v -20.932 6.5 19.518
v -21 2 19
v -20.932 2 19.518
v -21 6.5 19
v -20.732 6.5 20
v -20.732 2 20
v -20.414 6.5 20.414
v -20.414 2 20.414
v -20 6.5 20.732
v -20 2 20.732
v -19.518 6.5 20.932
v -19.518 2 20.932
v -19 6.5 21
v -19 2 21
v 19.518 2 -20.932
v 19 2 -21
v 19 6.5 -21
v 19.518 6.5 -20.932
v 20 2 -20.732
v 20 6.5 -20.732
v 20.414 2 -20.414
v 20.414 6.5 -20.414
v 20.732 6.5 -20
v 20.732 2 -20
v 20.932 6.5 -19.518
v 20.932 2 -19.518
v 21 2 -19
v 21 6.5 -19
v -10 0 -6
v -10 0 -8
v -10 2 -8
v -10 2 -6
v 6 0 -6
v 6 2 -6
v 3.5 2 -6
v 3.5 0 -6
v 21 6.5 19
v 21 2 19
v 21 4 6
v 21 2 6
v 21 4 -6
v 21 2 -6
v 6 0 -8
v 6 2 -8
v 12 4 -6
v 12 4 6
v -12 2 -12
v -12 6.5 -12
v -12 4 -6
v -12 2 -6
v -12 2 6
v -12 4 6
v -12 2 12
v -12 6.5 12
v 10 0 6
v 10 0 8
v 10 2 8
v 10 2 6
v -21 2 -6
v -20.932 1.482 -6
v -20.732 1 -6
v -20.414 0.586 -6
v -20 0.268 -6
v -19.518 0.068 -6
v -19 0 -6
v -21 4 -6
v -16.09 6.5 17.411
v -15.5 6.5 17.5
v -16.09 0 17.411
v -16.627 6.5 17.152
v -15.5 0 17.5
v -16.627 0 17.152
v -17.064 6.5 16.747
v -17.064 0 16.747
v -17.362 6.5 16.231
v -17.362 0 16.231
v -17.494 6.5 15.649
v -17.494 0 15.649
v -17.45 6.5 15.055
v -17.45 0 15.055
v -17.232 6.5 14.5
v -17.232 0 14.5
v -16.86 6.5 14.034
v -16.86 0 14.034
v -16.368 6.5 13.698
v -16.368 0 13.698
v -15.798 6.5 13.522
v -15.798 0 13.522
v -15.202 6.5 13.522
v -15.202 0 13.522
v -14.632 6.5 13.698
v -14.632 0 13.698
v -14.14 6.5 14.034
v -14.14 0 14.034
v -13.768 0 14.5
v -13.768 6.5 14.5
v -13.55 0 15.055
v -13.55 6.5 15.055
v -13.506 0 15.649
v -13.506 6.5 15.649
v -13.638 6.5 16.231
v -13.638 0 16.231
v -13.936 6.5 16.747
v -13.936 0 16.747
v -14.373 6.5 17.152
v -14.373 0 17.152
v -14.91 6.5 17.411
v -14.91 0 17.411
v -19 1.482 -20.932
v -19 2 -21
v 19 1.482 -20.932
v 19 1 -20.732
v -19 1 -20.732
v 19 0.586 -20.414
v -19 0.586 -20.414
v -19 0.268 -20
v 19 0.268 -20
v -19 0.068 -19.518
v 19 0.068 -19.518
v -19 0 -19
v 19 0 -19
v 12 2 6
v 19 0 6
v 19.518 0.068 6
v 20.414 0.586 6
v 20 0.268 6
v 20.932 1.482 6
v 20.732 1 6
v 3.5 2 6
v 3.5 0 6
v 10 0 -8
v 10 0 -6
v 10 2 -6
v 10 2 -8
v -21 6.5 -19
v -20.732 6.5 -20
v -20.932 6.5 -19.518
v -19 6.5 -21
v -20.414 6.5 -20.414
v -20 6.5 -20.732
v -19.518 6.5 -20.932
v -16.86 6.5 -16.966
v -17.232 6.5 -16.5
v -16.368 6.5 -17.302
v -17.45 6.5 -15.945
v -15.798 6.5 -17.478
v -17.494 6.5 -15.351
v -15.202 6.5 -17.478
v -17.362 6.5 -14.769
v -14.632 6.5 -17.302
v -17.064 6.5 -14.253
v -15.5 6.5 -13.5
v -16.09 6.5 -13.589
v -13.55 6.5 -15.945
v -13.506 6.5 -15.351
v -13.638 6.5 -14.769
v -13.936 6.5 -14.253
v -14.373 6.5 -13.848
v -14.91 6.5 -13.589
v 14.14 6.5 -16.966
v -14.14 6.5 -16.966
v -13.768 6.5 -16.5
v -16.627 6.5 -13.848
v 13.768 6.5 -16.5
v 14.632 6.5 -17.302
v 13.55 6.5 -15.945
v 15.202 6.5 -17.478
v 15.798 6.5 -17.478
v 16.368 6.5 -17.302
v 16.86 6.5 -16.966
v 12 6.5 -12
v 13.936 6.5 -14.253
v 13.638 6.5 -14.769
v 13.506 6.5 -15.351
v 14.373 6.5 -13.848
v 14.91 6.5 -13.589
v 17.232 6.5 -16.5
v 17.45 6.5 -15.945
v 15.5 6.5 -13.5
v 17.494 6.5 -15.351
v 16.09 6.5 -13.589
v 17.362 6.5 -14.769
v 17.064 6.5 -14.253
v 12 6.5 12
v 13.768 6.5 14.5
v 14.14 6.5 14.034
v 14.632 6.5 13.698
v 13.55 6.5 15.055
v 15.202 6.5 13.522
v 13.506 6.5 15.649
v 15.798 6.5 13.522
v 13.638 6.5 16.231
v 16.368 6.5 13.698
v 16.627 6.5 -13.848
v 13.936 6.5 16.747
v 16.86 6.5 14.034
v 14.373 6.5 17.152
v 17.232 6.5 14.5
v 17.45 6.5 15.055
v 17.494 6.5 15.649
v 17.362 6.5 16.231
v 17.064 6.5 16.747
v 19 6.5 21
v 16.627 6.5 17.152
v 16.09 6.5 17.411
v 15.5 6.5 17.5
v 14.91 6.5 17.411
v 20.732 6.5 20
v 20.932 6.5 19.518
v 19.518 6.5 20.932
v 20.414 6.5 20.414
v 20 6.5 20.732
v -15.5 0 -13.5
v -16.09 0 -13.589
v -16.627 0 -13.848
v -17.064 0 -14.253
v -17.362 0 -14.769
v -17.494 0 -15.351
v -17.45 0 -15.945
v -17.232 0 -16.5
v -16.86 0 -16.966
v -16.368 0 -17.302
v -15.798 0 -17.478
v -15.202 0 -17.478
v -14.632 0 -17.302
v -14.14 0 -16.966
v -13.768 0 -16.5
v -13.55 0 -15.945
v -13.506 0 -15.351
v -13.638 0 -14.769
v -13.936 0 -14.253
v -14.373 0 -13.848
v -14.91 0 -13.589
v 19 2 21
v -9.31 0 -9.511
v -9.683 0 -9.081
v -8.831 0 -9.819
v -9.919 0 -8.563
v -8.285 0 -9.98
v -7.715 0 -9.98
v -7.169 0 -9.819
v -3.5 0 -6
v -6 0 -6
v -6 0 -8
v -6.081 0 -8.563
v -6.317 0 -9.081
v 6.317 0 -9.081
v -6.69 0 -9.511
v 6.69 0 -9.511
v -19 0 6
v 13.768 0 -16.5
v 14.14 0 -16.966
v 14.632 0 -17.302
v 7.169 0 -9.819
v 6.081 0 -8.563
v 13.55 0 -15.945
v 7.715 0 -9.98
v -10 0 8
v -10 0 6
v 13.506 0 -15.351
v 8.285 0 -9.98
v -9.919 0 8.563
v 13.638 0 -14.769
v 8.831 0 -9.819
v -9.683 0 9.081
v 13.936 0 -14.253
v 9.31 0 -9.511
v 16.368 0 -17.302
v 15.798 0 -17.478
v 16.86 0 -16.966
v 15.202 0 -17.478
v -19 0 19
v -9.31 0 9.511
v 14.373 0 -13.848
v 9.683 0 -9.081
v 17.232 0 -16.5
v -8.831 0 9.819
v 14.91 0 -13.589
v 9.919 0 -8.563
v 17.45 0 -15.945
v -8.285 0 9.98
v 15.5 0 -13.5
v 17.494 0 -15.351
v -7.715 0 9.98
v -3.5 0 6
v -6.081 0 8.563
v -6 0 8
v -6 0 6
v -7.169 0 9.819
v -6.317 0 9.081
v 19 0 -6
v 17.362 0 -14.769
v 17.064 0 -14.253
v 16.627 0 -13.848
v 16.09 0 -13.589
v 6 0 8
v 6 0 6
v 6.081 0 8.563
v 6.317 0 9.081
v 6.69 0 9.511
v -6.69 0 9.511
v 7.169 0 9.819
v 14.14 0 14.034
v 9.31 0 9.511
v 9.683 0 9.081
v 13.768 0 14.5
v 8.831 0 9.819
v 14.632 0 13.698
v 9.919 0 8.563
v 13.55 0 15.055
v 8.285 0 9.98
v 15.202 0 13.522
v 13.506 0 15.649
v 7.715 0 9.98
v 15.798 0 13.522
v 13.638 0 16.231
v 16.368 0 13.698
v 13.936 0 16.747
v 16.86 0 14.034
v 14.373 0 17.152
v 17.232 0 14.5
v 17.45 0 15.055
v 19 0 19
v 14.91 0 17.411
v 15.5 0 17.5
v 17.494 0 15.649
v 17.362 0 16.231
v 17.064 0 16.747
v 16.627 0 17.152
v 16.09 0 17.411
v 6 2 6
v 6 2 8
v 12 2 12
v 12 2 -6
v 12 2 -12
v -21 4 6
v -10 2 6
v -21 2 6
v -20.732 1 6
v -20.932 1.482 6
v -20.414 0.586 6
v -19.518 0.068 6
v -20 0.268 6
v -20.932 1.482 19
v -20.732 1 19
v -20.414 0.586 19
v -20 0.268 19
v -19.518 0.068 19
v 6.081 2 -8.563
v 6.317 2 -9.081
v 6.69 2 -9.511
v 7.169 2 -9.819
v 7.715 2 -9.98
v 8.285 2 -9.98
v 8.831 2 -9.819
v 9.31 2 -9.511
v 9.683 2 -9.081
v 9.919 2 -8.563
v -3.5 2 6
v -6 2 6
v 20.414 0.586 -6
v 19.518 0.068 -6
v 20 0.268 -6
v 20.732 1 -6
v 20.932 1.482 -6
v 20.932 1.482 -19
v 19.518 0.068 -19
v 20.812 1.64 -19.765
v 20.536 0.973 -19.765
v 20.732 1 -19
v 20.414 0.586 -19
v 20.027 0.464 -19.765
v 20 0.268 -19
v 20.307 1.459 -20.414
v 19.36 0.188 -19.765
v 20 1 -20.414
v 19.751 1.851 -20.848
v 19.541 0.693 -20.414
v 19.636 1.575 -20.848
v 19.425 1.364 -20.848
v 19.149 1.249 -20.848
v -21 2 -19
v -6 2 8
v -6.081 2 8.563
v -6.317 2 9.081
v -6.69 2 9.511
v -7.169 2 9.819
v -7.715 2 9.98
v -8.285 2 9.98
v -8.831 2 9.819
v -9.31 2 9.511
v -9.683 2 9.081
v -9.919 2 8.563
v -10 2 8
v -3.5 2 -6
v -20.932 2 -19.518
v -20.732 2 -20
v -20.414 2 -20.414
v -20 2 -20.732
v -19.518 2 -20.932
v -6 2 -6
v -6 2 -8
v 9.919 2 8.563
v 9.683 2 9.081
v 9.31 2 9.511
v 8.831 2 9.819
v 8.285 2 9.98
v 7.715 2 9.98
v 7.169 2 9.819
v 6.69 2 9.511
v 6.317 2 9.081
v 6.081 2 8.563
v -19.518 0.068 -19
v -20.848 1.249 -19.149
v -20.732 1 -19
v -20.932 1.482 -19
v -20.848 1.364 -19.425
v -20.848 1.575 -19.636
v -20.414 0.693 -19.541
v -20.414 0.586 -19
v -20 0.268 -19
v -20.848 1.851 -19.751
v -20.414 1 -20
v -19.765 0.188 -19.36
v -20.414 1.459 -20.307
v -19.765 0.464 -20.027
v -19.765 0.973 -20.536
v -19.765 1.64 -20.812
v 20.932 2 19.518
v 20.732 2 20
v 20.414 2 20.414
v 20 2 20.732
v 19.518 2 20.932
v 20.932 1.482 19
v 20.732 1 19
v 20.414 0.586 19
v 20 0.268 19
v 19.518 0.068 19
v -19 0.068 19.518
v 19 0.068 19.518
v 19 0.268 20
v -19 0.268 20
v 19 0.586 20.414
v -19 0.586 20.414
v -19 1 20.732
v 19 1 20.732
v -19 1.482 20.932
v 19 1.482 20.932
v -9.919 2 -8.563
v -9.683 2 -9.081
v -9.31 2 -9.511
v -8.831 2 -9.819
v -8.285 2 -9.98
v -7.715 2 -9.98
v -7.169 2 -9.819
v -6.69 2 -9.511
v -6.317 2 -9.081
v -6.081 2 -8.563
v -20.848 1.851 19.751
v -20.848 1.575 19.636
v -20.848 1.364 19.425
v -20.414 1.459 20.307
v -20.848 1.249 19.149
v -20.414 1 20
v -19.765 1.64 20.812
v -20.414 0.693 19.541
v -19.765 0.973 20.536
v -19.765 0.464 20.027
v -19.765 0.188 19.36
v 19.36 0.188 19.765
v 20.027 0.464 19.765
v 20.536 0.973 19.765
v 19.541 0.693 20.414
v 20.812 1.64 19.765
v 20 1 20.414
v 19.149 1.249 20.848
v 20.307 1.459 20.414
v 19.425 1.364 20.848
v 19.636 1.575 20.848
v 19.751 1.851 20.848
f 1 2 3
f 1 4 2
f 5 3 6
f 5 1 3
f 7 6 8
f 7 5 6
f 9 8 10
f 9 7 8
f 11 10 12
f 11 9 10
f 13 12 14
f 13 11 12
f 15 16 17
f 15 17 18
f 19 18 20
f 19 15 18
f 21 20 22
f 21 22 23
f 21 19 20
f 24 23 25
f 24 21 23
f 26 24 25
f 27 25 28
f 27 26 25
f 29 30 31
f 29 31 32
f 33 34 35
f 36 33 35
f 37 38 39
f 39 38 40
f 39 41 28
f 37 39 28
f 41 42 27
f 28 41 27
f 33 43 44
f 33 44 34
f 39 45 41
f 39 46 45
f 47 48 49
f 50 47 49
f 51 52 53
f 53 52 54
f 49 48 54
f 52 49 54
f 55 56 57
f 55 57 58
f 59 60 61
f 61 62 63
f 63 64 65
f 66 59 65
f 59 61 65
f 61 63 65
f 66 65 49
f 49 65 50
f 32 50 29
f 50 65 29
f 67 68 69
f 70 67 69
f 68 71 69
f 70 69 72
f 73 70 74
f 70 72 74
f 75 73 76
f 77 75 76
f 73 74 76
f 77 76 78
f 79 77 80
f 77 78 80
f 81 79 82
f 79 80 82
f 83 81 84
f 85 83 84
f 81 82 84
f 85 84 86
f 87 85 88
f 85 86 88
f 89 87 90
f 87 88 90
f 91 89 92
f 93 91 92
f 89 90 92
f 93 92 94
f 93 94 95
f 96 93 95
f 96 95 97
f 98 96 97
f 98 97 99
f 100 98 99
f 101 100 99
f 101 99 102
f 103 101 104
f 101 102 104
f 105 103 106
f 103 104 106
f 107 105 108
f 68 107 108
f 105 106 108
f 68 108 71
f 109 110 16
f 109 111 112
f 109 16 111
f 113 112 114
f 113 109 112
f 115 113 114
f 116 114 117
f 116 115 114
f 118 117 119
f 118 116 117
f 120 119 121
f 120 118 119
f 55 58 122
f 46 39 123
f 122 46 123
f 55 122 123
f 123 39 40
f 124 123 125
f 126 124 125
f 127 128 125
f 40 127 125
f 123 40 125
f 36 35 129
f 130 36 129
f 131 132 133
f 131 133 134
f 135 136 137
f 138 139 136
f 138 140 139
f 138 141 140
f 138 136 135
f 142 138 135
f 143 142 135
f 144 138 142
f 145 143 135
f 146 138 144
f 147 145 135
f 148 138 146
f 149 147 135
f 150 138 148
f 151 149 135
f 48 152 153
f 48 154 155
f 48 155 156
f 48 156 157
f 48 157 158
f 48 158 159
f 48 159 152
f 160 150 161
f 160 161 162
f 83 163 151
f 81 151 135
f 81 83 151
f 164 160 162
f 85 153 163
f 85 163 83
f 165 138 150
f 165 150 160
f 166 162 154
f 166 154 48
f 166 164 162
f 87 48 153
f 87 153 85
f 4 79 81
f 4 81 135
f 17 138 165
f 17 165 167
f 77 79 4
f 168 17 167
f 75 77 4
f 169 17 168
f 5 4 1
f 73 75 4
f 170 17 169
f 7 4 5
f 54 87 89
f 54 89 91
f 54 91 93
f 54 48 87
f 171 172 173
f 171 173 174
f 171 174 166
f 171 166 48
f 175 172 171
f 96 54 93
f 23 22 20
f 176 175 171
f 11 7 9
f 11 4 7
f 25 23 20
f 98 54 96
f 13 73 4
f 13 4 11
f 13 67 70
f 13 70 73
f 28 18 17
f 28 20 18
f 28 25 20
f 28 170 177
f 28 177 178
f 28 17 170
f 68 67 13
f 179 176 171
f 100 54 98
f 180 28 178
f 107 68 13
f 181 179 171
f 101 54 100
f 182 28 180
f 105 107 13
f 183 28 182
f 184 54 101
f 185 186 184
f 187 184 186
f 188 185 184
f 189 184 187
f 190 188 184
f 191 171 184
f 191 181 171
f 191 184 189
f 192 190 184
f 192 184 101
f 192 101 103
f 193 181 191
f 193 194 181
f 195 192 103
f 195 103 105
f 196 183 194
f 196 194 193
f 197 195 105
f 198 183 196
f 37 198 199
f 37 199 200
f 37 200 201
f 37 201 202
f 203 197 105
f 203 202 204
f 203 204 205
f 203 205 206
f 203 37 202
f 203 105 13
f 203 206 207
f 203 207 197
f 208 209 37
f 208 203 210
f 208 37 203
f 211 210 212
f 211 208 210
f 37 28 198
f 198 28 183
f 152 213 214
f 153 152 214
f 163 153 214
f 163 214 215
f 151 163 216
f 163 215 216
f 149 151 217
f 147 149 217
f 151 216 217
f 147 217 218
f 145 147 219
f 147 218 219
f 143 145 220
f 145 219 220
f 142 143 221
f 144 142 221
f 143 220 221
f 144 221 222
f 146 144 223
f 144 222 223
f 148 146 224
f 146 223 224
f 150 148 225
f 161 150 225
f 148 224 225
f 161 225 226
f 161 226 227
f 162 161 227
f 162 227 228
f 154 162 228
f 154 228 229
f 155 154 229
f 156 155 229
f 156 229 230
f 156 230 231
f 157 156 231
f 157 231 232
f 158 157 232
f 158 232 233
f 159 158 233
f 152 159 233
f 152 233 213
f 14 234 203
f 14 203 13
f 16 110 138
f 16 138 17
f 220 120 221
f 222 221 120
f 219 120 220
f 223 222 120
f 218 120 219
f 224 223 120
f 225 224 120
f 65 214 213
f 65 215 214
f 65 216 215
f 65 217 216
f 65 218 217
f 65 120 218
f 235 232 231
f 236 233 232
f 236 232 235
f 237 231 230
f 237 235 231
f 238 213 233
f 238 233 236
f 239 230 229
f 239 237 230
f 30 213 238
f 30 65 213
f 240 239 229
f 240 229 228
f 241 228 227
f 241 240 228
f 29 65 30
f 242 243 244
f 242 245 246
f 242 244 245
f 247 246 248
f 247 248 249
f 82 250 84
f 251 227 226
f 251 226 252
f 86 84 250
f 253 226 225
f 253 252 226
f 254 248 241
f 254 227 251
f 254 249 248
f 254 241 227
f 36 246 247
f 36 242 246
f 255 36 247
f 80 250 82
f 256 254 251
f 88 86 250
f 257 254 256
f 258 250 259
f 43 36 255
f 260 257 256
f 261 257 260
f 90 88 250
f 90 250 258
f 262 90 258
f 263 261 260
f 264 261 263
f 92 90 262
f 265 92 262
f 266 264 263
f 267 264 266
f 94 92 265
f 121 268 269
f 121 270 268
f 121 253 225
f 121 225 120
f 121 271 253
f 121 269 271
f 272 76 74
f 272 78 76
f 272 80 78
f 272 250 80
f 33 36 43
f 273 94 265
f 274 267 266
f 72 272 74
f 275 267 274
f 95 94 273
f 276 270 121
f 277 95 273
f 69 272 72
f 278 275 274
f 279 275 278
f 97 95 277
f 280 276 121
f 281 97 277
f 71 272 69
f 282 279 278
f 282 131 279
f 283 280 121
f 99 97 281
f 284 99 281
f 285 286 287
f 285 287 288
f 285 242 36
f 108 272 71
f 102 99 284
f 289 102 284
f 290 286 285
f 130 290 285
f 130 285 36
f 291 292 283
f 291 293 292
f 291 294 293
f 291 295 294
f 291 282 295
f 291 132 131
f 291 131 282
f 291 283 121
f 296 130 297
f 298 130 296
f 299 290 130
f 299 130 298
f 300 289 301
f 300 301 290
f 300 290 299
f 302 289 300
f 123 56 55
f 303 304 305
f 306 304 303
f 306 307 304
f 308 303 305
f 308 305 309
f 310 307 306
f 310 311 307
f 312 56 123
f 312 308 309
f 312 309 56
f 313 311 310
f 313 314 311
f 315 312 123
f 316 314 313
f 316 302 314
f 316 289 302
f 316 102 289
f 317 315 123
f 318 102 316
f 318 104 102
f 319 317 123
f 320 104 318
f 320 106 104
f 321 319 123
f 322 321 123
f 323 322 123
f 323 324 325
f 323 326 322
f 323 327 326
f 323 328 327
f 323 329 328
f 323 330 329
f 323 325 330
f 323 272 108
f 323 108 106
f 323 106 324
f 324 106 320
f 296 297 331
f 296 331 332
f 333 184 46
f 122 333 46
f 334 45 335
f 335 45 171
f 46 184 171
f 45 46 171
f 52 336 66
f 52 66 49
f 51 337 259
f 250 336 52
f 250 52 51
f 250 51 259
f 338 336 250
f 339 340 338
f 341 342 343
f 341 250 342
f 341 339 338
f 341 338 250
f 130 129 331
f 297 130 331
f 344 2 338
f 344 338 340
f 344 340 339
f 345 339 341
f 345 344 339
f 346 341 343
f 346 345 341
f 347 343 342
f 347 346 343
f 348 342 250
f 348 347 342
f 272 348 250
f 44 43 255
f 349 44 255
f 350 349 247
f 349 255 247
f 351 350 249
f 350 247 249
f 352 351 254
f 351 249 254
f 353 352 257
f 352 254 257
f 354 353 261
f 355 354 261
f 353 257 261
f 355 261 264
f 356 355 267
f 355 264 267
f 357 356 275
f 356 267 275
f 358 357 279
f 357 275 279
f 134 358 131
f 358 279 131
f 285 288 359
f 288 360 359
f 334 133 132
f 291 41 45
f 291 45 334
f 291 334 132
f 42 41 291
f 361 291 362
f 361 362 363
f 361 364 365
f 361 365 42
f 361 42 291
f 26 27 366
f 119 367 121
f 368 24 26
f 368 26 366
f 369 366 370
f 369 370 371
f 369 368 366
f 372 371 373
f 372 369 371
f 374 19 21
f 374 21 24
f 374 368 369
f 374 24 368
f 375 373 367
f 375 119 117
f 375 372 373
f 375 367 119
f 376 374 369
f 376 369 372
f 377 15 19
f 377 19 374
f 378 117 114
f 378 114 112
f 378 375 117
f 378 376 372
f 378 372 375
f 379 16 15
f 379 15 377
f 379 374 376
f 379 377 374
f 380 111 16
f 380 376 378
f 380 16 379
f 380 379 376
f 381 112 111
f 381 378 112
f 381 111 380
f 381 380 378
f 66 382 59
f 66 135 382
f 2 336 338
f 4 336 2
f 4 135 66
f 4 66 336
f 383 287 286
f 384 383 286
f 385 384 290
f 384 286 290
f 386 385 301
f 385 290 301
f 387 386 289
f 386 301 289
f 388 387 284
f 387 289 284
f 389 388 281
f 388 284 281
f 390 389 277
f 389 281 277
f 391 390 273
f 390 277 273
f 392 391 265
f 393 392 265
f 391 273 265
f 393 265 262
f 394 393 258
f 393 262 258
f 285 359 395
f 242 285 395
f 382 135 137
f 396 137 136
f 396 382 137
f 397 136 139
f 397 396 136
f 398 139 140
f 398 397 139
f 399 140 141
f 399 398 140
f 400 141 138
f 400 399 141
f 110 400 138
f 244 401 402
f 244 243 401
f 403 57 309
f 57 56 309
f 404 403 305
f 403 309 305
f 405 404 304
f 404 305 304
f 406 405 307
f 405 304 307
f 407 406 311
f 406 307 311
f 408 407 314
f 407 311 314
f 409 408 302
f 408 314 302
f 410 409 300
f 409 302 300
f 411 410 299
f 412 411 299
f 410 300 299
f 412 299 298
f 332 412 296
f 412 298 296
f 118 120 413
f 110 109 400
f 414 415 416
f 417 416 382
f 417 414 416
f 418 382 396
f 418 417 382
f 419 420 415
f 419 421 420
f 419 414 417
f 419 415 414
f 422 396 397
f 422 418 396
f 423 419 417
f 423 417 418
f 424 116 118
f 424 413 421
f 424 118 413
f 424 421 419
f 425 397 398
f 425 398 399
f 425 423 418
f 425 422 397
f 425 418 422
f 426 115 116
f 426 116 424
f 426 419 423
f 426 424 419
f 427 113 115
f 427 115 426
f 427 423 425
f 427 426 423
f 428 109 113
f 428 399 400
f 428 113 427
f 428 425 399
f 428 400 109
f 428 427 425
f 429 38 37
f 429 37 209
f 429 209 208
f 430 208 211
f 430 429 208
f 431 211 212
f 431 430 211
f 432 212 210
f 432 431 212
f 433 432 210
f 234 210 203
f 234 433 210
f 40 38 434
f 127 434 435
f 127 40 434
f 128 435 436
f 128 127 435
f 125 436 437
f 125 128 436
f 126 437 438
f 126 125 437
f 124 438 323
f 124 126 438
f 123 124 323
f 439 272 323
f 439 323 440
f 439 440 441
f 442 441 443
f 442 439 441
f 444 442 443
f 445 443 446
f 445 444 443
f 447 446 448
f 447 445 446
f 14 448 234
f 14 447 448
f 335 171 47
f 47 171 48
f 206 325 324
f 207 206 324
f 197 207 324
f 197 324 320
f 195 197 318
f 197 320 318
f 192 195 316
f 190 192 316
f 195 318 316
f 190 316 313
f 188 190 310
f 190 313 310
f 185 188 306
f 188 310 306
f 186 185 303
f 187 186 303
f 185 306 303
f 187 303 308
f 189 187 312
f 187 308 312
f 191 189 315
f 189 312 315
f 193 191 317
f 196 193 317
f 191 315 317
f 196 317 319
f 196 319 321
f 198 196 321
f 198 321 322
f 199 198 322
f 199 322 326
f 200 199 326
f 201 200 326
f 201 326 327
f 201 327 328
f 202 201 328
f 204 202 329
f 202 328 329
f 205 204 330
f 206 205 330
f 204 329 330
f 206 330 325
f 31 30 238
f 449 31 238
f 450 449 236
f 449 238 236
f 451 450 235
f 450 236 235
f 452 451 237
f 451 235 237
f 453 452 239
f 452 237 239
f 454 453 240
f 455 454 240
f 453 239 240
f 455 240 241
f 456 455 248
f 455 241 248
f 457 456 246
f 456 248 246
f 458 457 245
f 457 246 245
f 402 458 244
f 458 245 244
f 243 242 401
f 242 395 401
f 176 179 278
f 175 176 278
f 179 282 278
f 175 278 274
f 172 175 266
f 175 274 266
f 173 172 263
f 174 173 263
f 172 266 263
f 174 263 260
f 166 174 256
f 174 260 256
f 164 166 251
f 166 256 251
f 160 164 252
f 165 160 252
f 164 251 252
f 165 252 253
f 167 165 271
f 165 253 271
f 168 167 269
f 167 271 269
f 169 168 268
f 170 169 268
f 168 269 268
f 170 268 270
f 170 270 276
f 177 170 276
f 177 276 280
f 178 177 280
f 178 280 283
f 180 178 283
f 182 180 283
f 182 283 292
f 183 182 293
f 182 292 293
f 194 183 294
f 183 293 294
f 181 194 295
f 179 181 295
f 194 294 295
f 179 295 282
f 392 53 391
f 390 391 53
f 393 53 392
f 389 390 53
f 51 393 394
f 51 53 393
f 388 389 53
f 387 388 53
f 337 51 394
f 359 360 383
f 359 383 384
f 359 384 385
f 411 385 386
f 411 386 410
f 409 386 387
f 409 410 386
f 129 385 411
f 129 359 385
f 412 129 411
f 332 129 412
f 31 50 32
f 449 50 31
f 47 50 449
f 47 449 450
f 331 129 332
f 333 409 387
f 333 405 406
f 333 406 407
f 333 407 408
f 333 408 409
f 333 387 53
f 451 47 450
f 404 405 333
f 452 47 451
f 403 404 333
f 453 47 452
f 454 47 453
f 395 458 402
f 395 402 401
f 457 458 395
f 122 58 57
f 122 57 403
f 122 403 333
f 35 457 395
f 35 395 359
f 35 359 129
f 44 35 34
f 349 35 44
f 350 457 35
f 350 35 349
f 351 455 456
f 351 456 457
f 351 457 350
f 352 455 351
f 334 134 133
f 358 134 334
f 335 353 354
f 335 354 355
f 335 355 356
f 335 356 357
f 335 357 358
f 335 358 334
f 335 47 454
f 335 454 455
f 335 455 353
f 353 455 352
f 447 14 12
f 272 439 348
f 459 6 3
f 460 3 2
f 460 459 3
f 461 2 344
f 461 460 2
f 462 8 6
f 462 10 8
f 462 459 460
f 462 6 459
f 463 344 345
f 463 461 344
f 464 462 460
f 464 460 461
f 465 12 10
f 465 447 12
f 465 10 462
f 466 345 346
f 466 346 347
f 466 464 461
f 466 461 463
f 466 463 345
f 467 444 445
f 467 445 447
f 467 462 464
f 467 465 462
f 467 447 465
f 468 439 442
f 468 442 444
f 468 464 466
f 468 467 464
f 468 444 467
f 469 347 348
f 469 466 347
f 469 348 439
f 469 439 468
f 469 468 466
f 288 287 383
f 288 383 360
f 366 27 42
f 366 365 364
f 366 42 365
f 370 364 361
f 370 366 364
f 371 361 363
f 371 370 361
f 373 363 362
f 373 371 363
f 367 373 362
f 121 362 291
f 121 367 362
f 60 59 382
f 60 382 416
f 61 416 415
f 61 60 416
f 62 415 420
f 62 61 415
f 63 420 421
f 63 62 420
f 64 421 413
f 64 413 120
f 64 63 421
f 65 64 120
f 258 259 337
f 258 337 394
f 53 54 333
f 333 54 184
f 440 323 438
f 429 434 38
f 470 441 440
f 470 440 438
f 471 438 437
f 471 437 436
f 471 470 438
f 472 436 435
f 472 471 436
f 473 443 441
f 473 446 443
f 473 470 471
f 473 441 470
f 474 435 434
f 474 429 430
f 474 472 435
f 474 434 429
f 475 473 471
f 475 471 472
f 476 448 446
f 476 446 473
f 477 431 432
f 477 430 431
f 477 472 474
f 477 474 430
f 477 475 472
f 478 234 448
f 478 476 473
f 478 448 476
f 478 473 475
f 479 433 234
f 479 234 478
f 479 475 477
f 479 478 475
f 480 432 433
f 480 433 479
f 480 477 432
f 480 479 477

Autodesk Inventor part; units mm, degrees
ref_plane "YZ Plane" through (0, 0, 0) normal (1, 0, 0) x (0, 1, 0)
ref_plane "XZ Plane" through (0, 0, 0) normal (0, 1, 0) x (-1, 0, 0)
sketch "Sketch1" plane through (0, 0, 0) normal (0, 1, 0) x (-1, 0, 0)
  line L0 (21, 21) -> (-21, 21)
  line L1 (-21, 21) -> (-21, -21)
  line L2 (-21, -21) -> (21, -21)
  line L3 (21, -21) -> (21, 21)
  line L4 (21, 21) -> (-21, -21) construction
  line L5 (-21, 21) -> (21, -21) construction
  point P0 (0, 0)
  dimension "d0" = 42
  dimension "d1" = 42
extrude "Extrusion1" add sketch "Sketch1" along normal blind 6.5
sketch "Sketch2" plane through (0, 6.5, 0) normal (0, 1, 0) x (1, 0, 0)
  line L0 (-12, -12) -> (12, -12)
  line L1 (12, -12) -> (12, 12)
  line L2 (12, 12) -> (-12, 12)
  line L3 (-12, 12) -> (-12, -12)
  line L4 (-12, -12) -> (12, 12) construction
  line L5 (12, -12) -> (-12, 12) construction
  point P0 (0, 0)
  dimension "d4" = 24
  dimension "d5" = 24
extrude "Extrusion2" cut sketch "Sketch2" against normal blind 4.5
sketch "Sketch3" plane through (0, 2, 0) normal (0, 1, 0) x (1, 0, 0)
  line L0 (-10.5, -6) -> (-3.5, -6)
  line L1 (-3.5, -6) -> (-3.5, 6)
  line L2 (-3.5, 6) -> (-10.5, 6)
  line L3 (-10.5, 6) -> (-10.5, -6)
  line L4 (-10.5, -6) -> (-3.5, 6) construction
  line L5 (-3.5, -6) -> (-10.5, 6) construction
  line L6 (-12, -12) -> (-12, 12) projected
  line L7 (3.5, -6) -> (10.5, -6)
  line L8 (10.5, -6) -> (10.5, 6)
  line L9 (10.5, 6) -> (3.5, 6)
  line L10 (3.5, 6) -> (3.5, -6)
  line L11 (3.5, -6) -> (10.5, 6) construction
  line L12 (10.5, -6) -> (3.5, 6) construction
  line L13 (12, 12) -> (12, -12) projected
  point P0 (0, 0)
  point P1 (-7, 0)
  point P2 (-7, 0)
  point P3 (7, 0)
  point P4 (7, 0)
  dimension "d8" = 7
  dimension "d9" = 12
  dimension "d10" = 1.5
  dimension "d11" = 7
  dimension "d12" = 1.5
  dimension "d13" = 12
extrude "Extrusion3" cut sketch "Sketch3" against normal blind 3.5
sketch "Sketch4" plane through (0, 2, 0) normal (0, 1, 0) x (1, 0, 0)
  line L0 (-12, -12) -> (-12, 12) projected
  line L1 (12, -12) -> (-12, -12) projected
  point P0 (0, 0)
  point P1 (-8, -8)
  point P2 (-8, 8)
  point P3 (8, 8)
  point P4 (8, -8)
  dimension "d16" = 16
  dimension "d17" = 16
  dimension "d18" = 4
  dimension "d19" = 4
hole "Hole1" at (-8, 2, 8) at (-8, 2, -8) at (8, 2, -8) at (8, 2, 8) direction (0, -1, 0) diameter 4 end through all
sketch "Sketch5" plane through (0, 6.5, 0) normal (0, 1, 0) x (1, 0, 0)
  line L0 (-21, -21) -> (21, -21) projected
  line L1 (-21, 21) -> (-21, -21) projected
  point P0 (0, 0)
  point P1 (-15.5, -15.5)
  point P2 (-15.5, 15.5)
  point P3 (15.5, 15.5)
  point P4 (15.5, -15.5)
  dimension "d27" = 31
  dimension "d28" = 31
  dimension "d29" = 5.5
  dimension "d30" = 5.5
hole "Hole2" at (-15.5, 6.5, 15.5) at (-15.5, 6.5, -15.5) at (15.5, 6.5, -15.5) at (15.5, 6.5, 15.5) direction (0, -1, 0) diameter 4 end through all
sketch "Sketch8" plane through (0, 0, 0) normal (0, -1, 0) x (1, 0, 0)
  line L0 (-21, -21) -> (-21, 21) projected
  line L1 (-21, 21) -> (-25, 21)
  line L2 (-25, 21) -> (-25, -21)
  line L3 (-25, -21) -> (-21, -21)
  line L4 (-21, -21) -> (-21, 21)
  line L5 (21, -21) -> (-21, -21) projected
  point P0 (0, 0)
  point P1 (25, -21)
  dimension "d48" = 4
extrude "Extrusion6" add sketch "Sketch8" against normal blind 46.5
sketch "Sketch9" plane through (-25, 0, -21) normal (-1, 0, 0) x (0, 0, 1)
  point P0 (21, 0)
ref_plane "Work Plane4" through (25, 0, 21) normal (1, 0, 0) x (0, 0, -1)
sketch "Sketch10" plane through (25, 0, 21) normal (1, 0, 0) x (0, 0, -1)
  line L0 (27, 2) -> (31, 2) projected
  line L1 (27, 2) -> (15, 2) projected
  line L2 (11, 2) -> (15, 2) projected
  line L3 (15, 2) -> (27, 2) projected
  line L4 (27, 2) -> (31, 2) projected
  line L5 (27, 2) -> (15, 2) projected
  line L6 (11, 2) -> (15, 2) projected
  line L7 (15, 2) -> (27, 2) projected
  line L8 (33, 2) -> (9, 2) projected
  line L9 (9, 2) -> (33, 2) projected
  line L10 (27, 2) -> (15, 2) projected
  line L11 (27, 2) -> (27, 0) projected
  line L12 (15, 2) -> (27, 2) projected
  line L13 (15, 2) -> (15, 0) projected
  line L14 (27, 0) -> (15, 0) projected
  point P0 (21, 0)
extrude "Extrusion7" cut sketch "Sketch10" against normal blind 15
sketch "Sketch11" plane through (-25, 0, -21) normal (-1, 0, 0) x (0, 0, 1)
  line L0 (27, 2) -> (27, 0) projected
  line L1 (15, 2) -> (27, 2) projected
  line L2 (15, 2) -> (15, 0) projected
  line L3 (27, 0) -> (15, 0) projected
  point P0 (21, 0)
extrude "Extrusion8" cut sketch "Sketch11" against normal blind 15
sketch "Sketch12" plane through (-25, 0, 6) normal (-1, 0, 0) x (0, 0, 1)
  line L0 (-27, 0) -> (-27, 46.5) projected
  point P0 (-6, 0)
  point P1 (-21, 41.5)
  point P2 (9, 41.5)
  point P3 (9, 11.5)
  point P4 (-21, 11.5)
  point P5 (-27, 5.5)
  dimension "d55" = 30
  dimension "d56" = 30
  dimension "d57" = 6
  dimension "d92" = 6
hole "Hole3" at (-25, 11.5, -15) at (-25, 11.5, 15) at (-25, 41.5, -15) at (-25, 41.5, 15) direction (1, 0, 0) diameter 3.5 depth 8 tip angle 118
sketch "Sketch13" plane through (-25, 0, 6) normal (-1, 0, 0) x (0, 0, 1)
  circle A0 centre (-21, 41.5) radius 1.75 projected
  circle A1 centre (-21, 11.5) radius 1.75 projected
  circle A2 centre (9, 11.5) radius 1.75 projected
  circle A3 centre (9, 41.5) radius 1.75 projected
  line L0 (0, 2) -> (0, 0) projected
  line L1 (15, 0) -> (0, 0) projected
  line L2 (15, 0) -> (15, 46.5) projected
  line L3 (-27, 46.5) -> (15, 46.5) projected
  line L4 (-27, 0) -> (-27, 46.5) projected
  line L5 (-12, 0) -> (-12, 2) projected
  line L6 (-12, 2) -> (0, 2) projected
  circle A4 centre (-21, 41.5) radius 3.25
  circle A5 centre (9, 41.5) radius 3.25
  circle A6 centre (9, 11.5) radius 3.25
  circle A7 centre (-21, 11.5) radius 3.25
  line L7 (-12, 0) -> (-27, 0) projected
  point P0 (-6, 0)
  dimension "d65" = 1.5
  dimension "d66" = 1.5
  dimension "d67" = 1.5
  dimension "d68" = 1.5
extrude "Extrusion9" add sketch "Sketch13" along normal blind 2 contours A4 | A5 | A6 | A7
fillet "Fillet2" radius 5 2 edges at (-23, 46.5, -21) (-23, 46.5, 21)
fillet "Fillet3" radius 1 4 edges at (-25, 11.5, 11.75) (-25, 41.5, 11.75) (-25, 41.5, -18.25) (-25, 11.5, -18.25)
sketch "Sketch16" plane through (-25, 2, -6) normal (0, -1, 0) x (1, 0, 0)
  line L0 (13, 12) -> (13, 0) projected
  line L1 (0, 12) -> (13, 12) projected
  line L2 (0, 0) -> (0, 12) projected
  line L3 (0, 0) -> (13, 0) projected
  line L4 (37, 0) -> (37, 12) projected
  line L5 (50, 0) -> (37, 0) projected
  line L6 (50, 12) -> (50, 0) projected
  line L7 (50, 12) -> (37, 12) projected
  point P0 (25, 6)
extrude "Extrusion11" cut sketch "Sketch16" against normal blind 2
sketch "Sketch17" plane through (-21, 6.5, 21) normal (1, 0, 0) x (0, 0, -1)
  arc A0 (5, 40) -> (0, 35) centre (5, 35) ccw projected
  line L0 (0, 0) -> (0, 35) projected
  line L1 (42, 0) -> (0, 0) projected
  line L2 (42, 0) -> (42, 35) projected
  arc A1 (42, 35) -> (37, 40) centre (37, 35) ccw projected
  line L3 (5, 40) -> (37, 40) projected
  circle A2 centre (36, 35) radius 1.75 projected
  circle A3 centre (36, 5) radius 1.75 projected
  circle A4 centre (6, 5) radius 1.75 projected
  circle A5 centre (6, 35) radius 1.75 projected
  point P0 (21, -6.5)
extrude "Extrusion12" cut sketch "Sketch17" against normal blind 0.8
sketch "Sketch19" plane through (-25, 0, 6) normal (-1, 0, 0) x (0, 0, 1)
  line L0 (6.5, 18.2831) -> (-6, 11.0662)
  line L1 (-6, 11.0662) -> (-18.5, 18.2831)
  line L2 (-18.5, 18.2831) -> (-18.5, 32.7169)
  line L3 (-18.5, 32.7169) -> (-6, 39.9338)
  line L4 (-6, 39.9338) -> (6.5, 32.7169)
  line L5 (6.5, 32.7169) -> (6.5, 18.2831)
  line L6 (-27, 0) -> (-27, 41.5) projected
  line L7 (-22, 46.5) -> (10, 46.5) projected
  point P0 (-6, 0)
  point P1 (-6, 25.5)
  dimension "d104" = 25
  dimension "d105" = 21
  dimension "d106" = 21
extrude "Extrusion14" cut sketch "Sketch19" against normal through all
fillet "Fillet4" radius 2 18 edges at (-23.4, 32.7169, -12.5) (-23.4, 39.9338, 0) (-23.4, 18.2831, -12.5) (-23.4, 11.0662, 0) (-23.4, 18.2831, 12.5) (-23.4, 32.7169, 12.5) (-25, 4, 0) (-25, 45.0355, 19.5355) (-25, 46.5, 0) (-25, 45.0355, -19.5355) (-25, 20.75, -21) (-25, 20.75, 21) (21, 0, -13.5) (21, 0, 13.5) (-25, 0, -13.5) (-25, 0, 13.5) (-2, 0, -21) (-2, 0, 21)
sketch "Sketch20" plane through (-21.8, 6.5, 21) normal (1, 0, 0) x (0, 0, -1)
  circle A0 centre (6, 35) radius 2.75
  circle A1 centre (6, 35) radius 1.75 projected
  point P0 (21, -6.5)
  dimension "d110" = 5.5
extrude "Extrusion15" cut sketch "Sketch20" against normal blind 3
pattern_linear "Rectangular Pattern2" count 2 spacing 30 along (0, 0, -1) count 2 spacing 30 along (0, -1, 0) of "Extrusion15"
sketch "Sketch21" plane through (0, 0, 0) normal (0, -1, 0) x (1, 0, 0)
  circle A0 centre (8, 8) radius 2 projected
  circle A1 centre (8, -8) radius 2 projected
  circle A2 centre (-8, -8) radius 2 projected
  circle A3 centre (-8, 8) radius 2 projected
  circle A4 centre (-8, 8) radius 2 projected
  line L0 (-10, 8) -> (-6, 8)
  line L1 (-6, 8) -> (-6, -8)
  line L2 (-6, -8) -> (-10, -8)
  line L3 (-10, -8) -> (-10, 8)
  line L4 (6, 8) -> (10, 8)
  line L5 (10, 8) -> (10, -8)
  line L6 (10, -8) -> (6, -8)
  line L7 (6, -8) -> (6, 8)
  point P0 (0, 0)
  point P1 (8, 6)
  point P2 (8, -6)
  point P3 (-8, -6)
  point P4 (-8, 6)
  point P5 (10, 8)
  point P6 (-6, 8)
extrude "Extrusion16" cut sketch "Sketch21" against normal blind 3 contours L5 A1 L7 A0 | A2 L3 A3 L1
sketch "Sketch22" plane through (-21.8, 6.5, 21) normal (1, 0, 0) x (0, 0, -1)
  circle A0 centre (36, 5) radius 2.75 projected
  circle A1 centre (6, 5) radius 2.75 projected
  circle A2 centre (36, 35) radius 2.75 projected
  circle A3 centre (6, 35) radius 2.75 projected
  line L0 (22, 32.8564) -> (32.5, 26.7942) projected
  arc A4 (33.5, 25.0622) -> (32.5, 26.7942) centre (31.5, 25.0622) ccw projected
  line L1 (33.5, 25.0622) -> (33.5, 12.9378) projected
  arc A5 (32.5, 11.2058) -> (33.5, 12.9378) centre (31.5, 12.9378) ccw projected
  line L2 (32.5, 11.2058) -> (22, 5.1436) projected
  arc A6 (20, 5.1436) -> (22, 5.1436) centre (21, 6.8756) ccw projected
  line L3 (20, 5.1436) -> (9.5, 11.2058) projected
  arc A7 (8.5, 12.9378) -> (9.5, 11.2058) centre (10.5, 12.9378) ccw projected
  line L4 (8.5, 12.9378) -> (8.5, 25.0622) projected
  arc A8 (9.5, 26.7942) -> (8.5, 25.0622) centre (10.5, 25.0622) ccw projected
  line L5 (9.5, 26.7942) -> (20, 32.8564) projected
  arc A9 (22, 32.8564) -> (20, 32.8564) centre (21, 31.1244) ccw projected
  arc A10 (42, 35) -> (37, 40) centre (37, 35) ccw projected
  line L6 (5, 40) -> (37, 40) projected
  arc A11 (5, 40) -> (0, 35) centre (5, 35) ccw projected
  line L7 (0, 0) -> (0, 35) projected
  line L8 (42, 0) -> (0, 0) projected
  line L9 (42, 35) -> (42, 0) projected
  circle A12 centre (36, 35) radius 1.75 projected
  circle A13 centre (36, 5) radius 1.75 projected
  circle A14 centre (6, 5) radius 1.75 projected
  circle A15 centre (6, 35) radius 1.75 projected
  point P0 (21, -6.5)
extrude "Extrusion17" cut sketch "Sketch22" against normal blind 10 contours A0 | A1 | A2 | A3 | L9 L8 L7 A11 L6 A10 | A12 | A13 | A14 | A15
fillet "Fillet5" radius 2 4 edges at (20.4142, 0.5858, 20.4142) (21, 4.25, 21) (20.4142, 0.5858, -20.4142) (21, 4.25, -21)
sketch "Sketch23" plane through (0, 6.5, 0) normal (0, 1, 0) x (1, 0, 0)
  circle A0 centre (15.5, 15.5) radius 2 projected
  circle A1 centre (-15.5, -15.5) radius 2 projected
  circle A2 centre (-15.5, 15.5) radius 2 projected
  circle A3 centre (15.5, -15.5) radius 2 projected
  line L0 (-12, 12) -> (12, 12) projected
  line L1 (12, 12) -> (12, -12) projected
  line L2 (12, -12) -> (-12, -12) projected
  line L3 (-12, -12) -> (-12, 12) projected
  arc A4 (21, 19) -> (19, 21) centre (19, 19) ccw projected
  line L4 (19, 21) -> (-23, 21) projected
  arc A5 (-23, 21) -> (-25, 19) centre (-23, 19) ccw projected
  line L5 (-25, -19) -> (-25, 19) projected
  arc A6 (-25, -19) -> (-23, -21) centre (-23, -19) ccw projected
  line L6 (19, -21) -> (-23, -21) projected
  arc A7 (19, -21) -> (21, -19) centre (19, -19) ccw projected
  line L7 (21, -19) -> (21, 19) projected
  line L8 (0, 0) -> (21, 0)
  line L9 (0, 0) -> (-21, 0)
  line L10 (-21, 0) -> (-21, 21)
  line L11 (-21, 0) -> (-21, -21)
  dimension "d124" = 21
  dimension "d125" = 21
extrude "Extrusion18" cut sketch "Sketch23" against normal blind 10 contours L11 L6 A6 L5 A5 L4 L10
fillet "Fillet6" radius 2 5 edges at (-21, 0.5858, -20.4142) (-21, 0, -12.5) (-21, 4.25, -21) (-21, 0.5858, 20.4142) (-21, 4.25, 21)
properties part number "Soporte base PCBs"
